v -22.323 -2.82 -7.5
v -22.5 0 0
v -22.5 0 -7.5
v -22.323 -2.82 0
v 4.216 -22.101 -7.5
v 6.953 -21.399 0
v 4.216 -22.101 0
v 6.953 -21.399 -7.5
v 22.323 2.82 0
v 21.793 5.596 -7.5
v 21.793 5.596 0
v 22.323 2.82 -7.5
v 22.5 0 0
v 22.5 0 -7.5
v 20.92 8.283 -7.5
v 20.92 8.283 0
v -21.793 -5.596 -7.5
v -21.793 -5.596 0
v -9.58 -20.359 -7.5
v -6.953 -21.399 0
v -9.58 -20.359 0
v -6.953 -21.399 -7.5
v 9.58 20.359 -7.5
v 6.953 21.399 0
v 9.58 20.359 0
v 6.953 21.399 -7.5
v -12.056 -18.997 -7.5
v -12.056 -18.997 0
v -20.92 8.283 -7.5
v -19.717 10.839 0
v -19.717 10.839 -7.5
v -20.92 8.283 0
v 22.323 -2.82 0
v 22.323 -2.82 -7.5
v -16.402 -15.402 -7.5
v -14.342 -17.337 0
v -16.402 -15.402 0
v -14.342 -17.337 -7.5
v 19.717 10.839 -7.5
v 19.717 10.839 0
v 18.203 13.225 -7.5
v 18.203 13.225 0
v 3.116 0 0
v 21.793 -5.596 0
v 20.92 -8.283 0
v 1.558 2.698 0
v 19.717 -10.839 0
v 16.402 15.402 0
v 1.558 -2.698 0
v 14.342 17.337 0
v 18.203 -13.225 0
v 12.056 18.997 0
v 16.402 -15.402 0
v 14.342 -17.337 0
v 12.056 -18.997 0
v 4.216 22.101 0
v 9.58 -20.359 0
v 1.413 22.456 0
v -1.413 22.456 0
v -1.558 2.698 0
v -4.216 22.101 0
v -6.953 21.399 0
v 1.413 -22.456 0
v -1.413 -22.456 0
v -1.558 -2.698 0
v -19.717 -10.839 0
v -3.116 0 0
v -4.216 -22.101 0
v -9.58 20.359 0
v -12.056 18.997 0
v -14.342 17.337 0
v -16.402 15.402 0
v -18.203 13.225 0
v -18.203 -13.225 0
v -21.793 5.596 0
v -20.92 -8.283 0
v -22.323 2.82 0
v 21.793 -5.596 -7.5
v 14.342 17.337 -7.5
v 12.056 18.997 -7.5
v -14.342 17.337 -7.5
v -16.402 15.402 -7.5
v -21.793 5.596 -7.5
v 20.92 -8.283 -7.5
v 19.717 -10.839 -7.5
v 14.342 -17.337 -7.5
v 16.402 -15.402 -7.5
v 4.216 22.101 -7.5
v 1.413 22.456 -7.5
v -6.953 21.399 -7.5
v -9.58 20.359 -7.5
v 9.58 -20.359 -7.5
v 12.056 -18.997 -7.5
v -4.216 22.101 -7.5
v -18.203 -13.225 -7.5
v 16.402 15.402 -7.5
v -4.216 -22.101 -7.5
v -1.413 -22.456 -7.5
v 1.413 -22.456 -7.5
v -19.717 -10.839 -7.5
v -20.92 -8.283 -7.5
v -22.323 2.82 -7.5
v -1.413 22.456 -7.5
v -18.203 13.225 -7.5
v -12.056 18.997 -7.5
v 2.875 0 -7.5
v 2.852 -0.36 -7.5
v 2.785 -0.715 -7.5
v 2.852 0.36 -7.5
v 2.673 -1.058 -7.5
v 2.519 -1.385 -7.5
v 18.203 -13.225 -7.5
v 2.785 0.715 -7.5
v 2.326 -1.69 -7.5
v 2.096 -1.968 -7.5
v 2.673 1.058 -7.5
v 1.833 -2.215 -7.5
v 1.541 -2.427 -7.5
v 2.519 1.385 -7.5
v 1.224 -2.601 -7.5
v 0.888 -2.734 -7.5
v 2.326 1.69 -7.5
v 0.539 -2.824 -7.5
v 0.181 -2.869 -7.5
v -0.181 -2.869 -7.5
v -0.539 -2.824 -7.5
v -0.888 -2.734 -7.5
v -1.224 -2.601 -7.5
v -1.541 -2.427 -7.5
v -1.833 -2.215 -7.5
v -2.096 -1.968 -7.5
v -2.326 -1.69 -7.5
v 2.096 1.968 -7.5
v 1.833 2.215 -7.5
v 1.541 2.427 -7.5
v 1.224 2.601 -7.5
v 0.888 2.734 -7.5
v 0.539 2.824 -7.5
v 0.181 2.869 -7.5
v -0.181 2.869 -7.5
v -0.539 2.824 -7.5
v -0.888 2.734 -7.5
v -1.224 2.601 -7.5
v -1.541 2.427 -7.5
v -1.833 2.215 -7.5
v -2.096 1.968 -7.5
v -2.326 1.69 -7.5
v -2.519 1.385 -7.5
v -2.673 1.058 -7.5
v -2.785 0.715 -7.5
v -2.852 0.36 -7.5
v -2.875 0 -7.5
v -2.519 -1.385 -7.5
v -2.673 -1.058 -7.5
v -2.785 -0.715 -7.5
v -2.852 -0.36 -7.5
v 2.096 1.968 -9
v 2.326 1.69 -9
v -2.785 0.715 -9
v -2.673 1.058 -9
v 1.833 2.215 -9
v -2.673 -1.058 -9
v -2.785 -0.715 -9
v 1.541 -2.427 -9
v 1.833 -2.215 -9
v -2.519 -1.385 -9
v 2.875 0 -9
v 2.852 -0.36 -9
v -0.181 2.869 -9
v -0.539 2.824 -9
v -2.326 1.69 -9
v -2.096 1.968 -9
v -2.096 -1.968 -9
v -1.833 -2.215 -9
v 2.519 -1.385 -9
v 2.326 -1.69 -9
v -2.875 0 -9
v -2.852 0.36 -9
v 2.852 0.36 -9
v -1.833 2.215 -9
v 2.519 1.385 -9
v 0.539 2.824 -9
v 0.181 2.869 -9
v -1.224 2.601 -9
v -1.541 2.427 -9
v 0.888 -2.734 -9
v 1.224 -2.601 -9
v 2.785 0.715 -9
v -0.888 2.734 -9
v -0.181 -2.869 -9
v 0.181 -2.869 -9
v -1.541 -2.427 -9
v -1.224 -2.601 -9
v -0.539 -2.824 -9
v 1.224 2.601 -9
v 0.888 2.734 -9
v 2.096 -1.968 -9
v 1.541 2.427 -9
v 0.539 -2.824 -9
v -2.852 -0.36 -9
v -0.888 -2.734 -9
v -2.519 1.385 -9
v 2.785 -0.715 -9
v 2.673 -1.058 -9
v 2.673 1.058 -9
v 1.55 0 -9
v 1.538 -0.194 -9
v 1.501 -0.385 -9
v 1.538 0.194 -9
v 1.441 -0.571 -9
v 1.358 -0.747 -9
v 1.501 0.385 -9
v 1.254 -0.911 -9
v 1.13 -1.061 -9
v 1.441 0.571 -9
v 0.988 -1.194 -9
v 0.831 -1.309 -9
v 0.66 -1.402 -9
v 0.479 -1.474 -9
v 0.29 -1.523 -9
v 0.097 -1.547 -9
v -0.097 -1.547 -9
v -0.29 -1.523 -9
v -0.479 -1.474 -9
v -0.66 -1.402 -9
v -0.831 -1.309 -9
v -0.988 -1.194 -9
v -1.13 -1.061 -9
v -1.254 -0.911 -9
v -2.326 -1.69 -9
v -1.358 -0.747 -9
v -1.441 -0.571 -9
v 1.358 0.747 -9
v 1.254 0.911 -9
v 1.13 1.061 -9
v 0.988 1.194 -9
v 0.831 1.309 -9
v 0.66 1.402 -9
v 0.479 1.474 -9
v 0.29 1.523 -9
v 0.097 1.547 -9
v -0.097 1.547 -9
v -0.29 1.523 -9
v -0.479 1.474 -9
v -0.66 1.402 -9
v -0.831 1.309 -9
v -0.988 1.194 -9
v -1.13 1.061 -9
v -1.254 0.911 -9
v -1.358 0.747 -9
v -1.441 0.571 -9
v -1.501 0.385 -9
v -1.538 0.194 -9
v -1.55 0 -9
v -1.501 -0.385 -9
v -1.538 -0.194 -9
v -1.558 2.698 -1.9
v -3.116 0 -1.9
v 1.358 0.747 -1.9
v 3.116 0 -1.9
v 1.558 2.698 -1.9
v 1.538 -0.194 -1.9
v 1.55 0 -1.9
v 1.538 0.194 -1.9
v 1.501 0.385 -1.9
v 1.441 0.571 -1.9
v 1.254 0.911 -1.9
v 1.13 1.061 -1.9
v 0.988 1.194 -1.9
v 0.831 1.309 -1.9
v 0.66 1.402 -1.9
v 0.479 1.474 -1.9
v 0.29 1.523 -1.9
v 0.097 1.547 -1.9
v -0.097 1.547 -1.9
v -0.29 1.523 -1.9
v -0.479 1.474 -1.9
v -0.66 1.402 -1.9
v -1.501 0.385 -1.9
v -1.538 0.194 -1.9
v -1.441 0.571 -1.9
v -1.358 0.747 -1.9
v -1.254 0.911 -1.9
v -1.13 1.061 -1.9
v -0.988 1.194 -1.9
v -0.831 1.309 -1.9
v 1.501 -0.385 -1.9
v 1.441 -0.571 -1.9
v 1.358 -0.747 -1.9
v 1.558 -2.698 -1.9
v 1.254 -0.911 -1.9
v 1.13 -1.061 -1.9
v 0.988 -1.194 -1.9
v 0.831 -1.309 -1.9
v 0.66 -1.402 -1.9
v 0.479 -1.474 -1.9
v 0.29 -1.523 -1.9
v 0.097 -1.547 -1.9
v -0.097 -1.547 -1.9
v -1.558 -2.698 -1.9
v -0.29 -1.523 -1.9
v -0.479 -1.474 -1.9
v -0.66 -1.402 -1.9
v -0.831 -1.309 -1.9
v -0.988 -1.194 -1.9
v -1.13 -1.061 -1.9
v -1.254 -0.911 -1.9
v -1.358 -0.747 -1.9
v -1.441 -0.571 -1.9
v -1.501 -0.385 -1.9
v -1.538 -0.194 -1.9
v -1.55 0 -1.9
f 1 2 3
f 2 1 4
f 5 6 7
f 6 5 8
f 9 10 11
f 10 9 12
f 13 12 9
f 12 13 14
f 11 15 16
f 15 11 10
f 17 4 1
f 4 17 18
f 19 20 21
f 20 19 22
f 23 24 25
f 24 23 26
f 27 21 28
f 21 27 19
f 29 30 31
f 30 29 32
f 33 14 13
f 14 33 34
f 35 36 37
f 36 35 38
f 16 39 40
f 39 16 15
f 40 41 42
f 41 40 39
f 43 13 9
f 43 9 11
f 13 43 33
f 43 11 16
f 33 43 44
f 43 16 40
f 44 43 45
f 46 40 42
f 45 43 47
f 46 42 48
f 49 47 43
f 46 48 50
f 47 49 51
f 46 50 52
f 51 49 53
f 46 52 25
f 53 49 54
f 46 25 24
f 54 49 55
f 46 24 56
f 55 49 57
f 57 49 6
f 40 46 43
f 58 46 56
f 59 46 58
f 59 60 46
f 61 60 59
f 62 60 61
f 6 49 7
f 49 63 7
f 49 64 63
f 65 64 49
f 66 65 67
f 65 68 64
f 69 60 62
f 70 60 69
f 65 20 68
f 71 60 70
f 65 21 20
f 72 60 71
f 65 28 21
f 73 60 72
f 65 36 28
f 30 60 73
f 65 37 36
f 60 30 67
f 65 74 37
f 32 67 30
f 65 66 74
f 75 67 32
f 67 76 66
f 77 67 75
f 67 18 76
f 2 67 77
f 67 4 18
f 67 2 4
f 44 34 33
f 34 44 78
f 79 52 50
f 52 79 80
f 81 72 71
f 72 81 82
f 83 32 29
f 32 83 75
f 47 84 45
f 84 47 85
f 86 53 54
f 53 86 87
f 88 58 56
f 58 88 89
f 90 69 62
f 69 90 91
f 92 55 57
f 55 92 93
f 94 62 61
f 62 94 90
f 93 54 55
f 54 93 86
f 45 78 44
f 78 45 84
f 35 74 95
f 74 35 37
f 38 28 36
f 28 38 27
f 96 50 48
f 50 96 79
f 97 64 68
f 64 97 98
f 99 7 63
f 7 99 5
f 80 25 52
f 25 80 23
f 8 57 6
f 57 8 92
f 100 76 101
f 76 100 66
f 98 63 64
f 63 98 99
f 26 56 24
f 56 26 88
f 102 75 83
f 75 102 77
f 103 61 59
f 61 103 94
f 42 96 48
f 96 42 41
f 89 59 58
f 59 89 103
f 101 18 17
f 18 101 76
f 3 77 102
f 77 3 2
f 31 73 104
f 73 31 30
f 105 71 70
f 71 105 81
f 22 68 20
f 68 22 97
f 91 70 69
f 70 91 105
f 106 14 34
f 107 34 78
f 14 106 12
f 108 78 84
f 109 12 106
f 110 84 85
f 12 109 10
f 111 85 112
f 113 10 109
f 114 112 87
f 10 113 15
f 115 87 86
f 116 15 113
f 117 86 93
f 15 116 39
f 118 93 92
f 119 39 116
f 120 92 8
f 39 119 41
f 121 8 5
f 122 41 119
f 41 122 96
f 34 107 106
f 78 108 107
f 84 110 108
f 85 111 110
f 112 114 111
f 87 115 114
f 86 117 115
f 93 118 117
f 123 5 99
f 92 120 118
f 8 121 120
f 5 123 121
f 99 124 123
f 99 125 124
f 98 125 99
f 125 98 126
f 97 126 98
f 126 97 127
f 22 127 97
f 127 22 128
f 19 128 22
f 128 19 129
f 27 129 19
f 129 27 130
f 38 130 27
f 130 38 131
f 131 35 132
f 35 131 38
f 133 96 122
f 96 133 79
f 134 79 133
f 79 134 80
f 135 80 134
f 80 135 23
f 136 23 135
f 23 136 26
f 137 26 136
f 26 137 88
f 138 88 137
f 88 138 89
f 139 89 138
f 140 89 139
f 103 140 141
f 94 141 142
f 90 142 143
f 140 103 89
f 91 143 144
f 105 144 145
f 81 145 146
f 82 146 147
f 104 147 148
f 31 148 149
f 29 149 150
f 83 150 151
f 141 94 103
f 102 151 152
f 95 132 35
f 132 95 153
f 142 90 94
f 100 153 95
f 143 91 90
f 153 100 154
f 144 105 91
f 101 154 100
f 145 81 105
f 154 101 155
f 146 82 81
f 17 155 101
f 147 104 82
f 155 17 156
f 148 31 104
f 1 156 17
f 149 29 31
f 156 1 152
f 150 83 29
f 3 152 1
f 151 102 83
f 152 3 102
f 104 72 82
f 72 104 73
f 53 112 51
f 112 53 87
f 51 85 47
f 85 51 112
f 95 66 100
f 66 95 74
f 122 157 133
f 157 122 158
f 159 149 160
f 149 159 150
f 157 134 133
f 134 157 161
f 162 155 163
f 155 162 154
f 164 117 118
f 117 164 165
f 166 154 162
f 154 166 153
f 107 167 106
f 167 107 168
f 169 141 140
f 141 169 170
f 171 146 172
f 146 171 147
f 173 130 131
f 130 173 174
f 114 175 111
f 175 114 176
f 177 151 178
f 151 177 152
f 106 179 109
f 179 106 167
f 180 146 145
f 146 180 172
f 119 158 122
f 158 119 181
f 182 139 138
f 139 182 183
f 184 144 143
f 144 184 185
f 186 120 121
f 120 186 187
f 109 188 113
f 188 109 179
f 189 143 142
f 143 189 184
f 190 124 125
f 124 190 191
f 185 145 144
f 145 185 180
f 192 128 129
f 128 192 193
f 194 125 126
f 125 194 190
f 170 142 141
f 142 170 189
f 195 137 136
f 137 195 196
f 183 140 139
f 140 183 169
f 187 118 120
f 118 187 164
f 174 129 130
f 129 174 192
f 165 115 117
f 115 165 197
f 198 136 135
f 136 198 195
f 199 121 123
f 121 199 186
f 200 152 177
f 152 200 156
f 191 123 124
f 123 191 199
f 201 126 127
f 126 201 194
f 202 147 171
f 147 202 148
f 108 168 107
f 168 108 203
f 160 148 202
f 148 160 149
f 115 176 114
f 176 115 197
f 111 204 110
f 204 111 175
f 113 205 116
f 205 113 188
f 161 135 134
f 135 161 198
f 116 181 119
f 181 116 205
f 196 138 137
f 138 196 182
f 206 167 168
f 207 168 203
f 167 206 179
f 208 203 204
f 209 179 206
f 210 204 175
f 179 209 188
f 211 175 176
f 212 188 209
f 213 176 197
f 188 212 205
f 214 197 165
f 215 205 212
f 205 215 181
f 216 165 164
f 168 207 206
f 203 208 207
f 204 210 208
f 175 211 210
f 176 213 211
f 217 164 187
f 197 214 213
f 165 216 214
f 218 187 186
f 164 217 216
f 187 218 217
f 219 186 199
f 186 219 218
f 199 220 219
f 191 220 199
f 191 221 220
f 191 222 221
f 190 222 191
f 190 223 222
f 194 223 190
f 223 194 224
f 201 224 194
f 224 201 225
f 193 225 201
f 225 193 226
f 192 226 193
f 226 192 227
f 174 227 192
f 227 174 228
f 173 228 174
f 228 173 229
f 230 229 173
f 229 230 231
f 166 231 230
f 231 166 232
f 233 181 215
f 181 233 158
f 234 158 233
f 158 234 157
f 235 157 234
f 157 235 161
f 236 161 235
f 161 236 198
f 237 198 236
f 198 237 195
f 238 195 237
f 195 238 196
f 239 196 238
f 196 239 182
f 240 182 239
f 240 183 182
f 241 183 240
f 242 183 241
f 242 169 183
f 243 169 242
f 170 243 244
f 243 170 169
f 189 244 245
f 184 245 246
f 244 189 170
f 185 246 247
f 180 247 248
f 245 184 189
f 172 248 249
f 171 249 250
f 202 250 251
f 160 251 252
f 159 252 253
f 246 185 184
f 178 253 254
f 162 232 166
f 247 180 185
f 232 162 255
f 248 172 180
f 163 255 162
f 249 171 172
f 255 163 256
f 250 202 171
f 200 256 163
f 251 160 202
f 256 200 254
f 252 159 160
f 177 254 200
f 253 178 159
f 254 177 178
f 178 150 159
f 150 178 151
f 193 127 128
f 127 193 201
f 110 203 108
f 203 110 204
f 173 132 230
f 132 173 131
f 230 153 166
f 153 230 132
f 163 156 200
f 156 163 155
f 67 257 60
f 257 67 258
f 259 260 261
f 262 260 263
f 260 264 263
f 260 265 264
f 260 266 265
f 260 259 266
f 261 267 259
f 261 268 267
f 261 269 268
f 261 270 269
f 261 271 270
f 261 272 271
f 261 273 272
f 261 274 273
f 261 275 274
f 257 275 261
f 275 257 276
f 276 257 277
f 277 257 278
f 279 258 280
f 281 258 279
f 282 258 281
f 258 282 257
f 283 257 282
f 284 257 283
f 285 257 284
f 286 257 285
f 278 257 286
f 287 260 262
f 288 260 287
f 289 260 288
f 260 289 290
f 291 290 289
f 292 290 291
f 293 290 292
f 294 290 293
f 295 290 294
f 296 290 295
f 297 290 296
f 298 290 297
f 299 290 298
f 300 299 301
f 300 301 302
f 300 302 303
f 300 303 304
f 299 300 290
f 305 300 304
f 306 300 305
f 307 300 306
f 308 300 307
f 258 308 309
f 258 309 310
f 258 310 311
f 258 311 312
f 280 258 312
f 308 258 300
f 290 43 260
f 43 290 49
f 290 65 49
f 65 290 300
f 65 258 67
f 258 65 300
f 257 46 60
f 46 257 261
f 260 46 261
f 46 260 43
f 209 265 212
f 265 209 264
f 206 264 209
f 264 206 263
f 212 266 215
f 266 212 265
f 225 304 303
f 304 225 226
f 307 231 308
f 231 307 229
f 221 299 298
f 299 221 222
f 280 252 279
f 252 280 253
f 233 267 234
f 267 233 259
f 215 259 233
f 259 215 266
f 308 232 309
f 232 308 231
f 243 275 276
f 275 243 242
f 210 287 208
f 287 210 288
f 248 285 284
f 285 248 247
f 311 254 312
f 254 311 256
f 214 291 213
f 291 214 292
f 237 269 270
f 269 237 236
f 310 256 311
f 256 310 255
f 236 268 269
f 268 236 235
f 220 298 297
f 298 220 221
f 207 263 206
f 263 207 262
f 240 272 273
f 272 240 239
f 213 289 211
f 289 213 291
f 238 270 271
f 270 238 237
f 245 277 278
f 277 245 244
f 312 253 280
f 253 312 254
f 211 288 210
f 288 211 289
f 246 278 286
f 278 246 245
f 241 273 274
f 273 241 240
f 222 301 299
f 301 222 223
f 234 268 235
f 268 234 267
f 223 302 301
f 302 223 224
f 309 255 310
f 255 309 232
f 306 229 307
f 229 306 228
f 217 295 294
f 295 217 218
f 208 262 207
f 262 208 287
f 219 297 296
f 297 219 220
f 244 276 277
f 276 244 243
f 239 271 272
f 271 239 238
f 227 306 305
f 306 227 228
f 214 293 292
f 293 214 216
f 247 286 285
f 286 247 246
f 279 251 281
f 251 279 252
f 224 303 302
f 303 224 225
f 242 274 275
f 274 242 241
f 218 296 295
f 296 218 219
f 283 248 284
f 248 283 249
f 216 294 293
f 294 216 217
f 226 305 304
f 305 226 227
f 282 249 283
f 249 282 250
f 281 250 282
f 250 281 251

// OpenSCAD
$fn = 50;


difference() {
	union() {
		translate(v = [0, 0, -7.5000000000]) {
			cylinder(h = 7.5000000000, r = 22.5000000000);
		}
		#translate(v = [0, 0, -9.0000000000]) {
			cylinder(h = 9, r = 2.8750000000);
		}
	}
	union() {
		translate(v = [0, 0, 0]) {
			rotate(a = [0, 0, 0]) {
				difference() {
					union() {
						translate(v = [0, 0, -1.9000000000]) {
							linear_extrude(height = 1.9000000000) {
								polygon(points = [[3.1158000000, 0.0000000000], [1.5579000000, 2.6983619531], [-1.5579000000, 2.6983619531], [-3.1158000000, 0.0000000000], [-1.5579000000, -2.6983619531], [1.5579000000, -2.6983619531]]);
							}
						}
					}
					union();
				}
			}
		}
		#translate(v = [0, 0, -100.0000000000]) {
			cylinder(h = 200, r = 1.5500000000);
		}
	}
}
